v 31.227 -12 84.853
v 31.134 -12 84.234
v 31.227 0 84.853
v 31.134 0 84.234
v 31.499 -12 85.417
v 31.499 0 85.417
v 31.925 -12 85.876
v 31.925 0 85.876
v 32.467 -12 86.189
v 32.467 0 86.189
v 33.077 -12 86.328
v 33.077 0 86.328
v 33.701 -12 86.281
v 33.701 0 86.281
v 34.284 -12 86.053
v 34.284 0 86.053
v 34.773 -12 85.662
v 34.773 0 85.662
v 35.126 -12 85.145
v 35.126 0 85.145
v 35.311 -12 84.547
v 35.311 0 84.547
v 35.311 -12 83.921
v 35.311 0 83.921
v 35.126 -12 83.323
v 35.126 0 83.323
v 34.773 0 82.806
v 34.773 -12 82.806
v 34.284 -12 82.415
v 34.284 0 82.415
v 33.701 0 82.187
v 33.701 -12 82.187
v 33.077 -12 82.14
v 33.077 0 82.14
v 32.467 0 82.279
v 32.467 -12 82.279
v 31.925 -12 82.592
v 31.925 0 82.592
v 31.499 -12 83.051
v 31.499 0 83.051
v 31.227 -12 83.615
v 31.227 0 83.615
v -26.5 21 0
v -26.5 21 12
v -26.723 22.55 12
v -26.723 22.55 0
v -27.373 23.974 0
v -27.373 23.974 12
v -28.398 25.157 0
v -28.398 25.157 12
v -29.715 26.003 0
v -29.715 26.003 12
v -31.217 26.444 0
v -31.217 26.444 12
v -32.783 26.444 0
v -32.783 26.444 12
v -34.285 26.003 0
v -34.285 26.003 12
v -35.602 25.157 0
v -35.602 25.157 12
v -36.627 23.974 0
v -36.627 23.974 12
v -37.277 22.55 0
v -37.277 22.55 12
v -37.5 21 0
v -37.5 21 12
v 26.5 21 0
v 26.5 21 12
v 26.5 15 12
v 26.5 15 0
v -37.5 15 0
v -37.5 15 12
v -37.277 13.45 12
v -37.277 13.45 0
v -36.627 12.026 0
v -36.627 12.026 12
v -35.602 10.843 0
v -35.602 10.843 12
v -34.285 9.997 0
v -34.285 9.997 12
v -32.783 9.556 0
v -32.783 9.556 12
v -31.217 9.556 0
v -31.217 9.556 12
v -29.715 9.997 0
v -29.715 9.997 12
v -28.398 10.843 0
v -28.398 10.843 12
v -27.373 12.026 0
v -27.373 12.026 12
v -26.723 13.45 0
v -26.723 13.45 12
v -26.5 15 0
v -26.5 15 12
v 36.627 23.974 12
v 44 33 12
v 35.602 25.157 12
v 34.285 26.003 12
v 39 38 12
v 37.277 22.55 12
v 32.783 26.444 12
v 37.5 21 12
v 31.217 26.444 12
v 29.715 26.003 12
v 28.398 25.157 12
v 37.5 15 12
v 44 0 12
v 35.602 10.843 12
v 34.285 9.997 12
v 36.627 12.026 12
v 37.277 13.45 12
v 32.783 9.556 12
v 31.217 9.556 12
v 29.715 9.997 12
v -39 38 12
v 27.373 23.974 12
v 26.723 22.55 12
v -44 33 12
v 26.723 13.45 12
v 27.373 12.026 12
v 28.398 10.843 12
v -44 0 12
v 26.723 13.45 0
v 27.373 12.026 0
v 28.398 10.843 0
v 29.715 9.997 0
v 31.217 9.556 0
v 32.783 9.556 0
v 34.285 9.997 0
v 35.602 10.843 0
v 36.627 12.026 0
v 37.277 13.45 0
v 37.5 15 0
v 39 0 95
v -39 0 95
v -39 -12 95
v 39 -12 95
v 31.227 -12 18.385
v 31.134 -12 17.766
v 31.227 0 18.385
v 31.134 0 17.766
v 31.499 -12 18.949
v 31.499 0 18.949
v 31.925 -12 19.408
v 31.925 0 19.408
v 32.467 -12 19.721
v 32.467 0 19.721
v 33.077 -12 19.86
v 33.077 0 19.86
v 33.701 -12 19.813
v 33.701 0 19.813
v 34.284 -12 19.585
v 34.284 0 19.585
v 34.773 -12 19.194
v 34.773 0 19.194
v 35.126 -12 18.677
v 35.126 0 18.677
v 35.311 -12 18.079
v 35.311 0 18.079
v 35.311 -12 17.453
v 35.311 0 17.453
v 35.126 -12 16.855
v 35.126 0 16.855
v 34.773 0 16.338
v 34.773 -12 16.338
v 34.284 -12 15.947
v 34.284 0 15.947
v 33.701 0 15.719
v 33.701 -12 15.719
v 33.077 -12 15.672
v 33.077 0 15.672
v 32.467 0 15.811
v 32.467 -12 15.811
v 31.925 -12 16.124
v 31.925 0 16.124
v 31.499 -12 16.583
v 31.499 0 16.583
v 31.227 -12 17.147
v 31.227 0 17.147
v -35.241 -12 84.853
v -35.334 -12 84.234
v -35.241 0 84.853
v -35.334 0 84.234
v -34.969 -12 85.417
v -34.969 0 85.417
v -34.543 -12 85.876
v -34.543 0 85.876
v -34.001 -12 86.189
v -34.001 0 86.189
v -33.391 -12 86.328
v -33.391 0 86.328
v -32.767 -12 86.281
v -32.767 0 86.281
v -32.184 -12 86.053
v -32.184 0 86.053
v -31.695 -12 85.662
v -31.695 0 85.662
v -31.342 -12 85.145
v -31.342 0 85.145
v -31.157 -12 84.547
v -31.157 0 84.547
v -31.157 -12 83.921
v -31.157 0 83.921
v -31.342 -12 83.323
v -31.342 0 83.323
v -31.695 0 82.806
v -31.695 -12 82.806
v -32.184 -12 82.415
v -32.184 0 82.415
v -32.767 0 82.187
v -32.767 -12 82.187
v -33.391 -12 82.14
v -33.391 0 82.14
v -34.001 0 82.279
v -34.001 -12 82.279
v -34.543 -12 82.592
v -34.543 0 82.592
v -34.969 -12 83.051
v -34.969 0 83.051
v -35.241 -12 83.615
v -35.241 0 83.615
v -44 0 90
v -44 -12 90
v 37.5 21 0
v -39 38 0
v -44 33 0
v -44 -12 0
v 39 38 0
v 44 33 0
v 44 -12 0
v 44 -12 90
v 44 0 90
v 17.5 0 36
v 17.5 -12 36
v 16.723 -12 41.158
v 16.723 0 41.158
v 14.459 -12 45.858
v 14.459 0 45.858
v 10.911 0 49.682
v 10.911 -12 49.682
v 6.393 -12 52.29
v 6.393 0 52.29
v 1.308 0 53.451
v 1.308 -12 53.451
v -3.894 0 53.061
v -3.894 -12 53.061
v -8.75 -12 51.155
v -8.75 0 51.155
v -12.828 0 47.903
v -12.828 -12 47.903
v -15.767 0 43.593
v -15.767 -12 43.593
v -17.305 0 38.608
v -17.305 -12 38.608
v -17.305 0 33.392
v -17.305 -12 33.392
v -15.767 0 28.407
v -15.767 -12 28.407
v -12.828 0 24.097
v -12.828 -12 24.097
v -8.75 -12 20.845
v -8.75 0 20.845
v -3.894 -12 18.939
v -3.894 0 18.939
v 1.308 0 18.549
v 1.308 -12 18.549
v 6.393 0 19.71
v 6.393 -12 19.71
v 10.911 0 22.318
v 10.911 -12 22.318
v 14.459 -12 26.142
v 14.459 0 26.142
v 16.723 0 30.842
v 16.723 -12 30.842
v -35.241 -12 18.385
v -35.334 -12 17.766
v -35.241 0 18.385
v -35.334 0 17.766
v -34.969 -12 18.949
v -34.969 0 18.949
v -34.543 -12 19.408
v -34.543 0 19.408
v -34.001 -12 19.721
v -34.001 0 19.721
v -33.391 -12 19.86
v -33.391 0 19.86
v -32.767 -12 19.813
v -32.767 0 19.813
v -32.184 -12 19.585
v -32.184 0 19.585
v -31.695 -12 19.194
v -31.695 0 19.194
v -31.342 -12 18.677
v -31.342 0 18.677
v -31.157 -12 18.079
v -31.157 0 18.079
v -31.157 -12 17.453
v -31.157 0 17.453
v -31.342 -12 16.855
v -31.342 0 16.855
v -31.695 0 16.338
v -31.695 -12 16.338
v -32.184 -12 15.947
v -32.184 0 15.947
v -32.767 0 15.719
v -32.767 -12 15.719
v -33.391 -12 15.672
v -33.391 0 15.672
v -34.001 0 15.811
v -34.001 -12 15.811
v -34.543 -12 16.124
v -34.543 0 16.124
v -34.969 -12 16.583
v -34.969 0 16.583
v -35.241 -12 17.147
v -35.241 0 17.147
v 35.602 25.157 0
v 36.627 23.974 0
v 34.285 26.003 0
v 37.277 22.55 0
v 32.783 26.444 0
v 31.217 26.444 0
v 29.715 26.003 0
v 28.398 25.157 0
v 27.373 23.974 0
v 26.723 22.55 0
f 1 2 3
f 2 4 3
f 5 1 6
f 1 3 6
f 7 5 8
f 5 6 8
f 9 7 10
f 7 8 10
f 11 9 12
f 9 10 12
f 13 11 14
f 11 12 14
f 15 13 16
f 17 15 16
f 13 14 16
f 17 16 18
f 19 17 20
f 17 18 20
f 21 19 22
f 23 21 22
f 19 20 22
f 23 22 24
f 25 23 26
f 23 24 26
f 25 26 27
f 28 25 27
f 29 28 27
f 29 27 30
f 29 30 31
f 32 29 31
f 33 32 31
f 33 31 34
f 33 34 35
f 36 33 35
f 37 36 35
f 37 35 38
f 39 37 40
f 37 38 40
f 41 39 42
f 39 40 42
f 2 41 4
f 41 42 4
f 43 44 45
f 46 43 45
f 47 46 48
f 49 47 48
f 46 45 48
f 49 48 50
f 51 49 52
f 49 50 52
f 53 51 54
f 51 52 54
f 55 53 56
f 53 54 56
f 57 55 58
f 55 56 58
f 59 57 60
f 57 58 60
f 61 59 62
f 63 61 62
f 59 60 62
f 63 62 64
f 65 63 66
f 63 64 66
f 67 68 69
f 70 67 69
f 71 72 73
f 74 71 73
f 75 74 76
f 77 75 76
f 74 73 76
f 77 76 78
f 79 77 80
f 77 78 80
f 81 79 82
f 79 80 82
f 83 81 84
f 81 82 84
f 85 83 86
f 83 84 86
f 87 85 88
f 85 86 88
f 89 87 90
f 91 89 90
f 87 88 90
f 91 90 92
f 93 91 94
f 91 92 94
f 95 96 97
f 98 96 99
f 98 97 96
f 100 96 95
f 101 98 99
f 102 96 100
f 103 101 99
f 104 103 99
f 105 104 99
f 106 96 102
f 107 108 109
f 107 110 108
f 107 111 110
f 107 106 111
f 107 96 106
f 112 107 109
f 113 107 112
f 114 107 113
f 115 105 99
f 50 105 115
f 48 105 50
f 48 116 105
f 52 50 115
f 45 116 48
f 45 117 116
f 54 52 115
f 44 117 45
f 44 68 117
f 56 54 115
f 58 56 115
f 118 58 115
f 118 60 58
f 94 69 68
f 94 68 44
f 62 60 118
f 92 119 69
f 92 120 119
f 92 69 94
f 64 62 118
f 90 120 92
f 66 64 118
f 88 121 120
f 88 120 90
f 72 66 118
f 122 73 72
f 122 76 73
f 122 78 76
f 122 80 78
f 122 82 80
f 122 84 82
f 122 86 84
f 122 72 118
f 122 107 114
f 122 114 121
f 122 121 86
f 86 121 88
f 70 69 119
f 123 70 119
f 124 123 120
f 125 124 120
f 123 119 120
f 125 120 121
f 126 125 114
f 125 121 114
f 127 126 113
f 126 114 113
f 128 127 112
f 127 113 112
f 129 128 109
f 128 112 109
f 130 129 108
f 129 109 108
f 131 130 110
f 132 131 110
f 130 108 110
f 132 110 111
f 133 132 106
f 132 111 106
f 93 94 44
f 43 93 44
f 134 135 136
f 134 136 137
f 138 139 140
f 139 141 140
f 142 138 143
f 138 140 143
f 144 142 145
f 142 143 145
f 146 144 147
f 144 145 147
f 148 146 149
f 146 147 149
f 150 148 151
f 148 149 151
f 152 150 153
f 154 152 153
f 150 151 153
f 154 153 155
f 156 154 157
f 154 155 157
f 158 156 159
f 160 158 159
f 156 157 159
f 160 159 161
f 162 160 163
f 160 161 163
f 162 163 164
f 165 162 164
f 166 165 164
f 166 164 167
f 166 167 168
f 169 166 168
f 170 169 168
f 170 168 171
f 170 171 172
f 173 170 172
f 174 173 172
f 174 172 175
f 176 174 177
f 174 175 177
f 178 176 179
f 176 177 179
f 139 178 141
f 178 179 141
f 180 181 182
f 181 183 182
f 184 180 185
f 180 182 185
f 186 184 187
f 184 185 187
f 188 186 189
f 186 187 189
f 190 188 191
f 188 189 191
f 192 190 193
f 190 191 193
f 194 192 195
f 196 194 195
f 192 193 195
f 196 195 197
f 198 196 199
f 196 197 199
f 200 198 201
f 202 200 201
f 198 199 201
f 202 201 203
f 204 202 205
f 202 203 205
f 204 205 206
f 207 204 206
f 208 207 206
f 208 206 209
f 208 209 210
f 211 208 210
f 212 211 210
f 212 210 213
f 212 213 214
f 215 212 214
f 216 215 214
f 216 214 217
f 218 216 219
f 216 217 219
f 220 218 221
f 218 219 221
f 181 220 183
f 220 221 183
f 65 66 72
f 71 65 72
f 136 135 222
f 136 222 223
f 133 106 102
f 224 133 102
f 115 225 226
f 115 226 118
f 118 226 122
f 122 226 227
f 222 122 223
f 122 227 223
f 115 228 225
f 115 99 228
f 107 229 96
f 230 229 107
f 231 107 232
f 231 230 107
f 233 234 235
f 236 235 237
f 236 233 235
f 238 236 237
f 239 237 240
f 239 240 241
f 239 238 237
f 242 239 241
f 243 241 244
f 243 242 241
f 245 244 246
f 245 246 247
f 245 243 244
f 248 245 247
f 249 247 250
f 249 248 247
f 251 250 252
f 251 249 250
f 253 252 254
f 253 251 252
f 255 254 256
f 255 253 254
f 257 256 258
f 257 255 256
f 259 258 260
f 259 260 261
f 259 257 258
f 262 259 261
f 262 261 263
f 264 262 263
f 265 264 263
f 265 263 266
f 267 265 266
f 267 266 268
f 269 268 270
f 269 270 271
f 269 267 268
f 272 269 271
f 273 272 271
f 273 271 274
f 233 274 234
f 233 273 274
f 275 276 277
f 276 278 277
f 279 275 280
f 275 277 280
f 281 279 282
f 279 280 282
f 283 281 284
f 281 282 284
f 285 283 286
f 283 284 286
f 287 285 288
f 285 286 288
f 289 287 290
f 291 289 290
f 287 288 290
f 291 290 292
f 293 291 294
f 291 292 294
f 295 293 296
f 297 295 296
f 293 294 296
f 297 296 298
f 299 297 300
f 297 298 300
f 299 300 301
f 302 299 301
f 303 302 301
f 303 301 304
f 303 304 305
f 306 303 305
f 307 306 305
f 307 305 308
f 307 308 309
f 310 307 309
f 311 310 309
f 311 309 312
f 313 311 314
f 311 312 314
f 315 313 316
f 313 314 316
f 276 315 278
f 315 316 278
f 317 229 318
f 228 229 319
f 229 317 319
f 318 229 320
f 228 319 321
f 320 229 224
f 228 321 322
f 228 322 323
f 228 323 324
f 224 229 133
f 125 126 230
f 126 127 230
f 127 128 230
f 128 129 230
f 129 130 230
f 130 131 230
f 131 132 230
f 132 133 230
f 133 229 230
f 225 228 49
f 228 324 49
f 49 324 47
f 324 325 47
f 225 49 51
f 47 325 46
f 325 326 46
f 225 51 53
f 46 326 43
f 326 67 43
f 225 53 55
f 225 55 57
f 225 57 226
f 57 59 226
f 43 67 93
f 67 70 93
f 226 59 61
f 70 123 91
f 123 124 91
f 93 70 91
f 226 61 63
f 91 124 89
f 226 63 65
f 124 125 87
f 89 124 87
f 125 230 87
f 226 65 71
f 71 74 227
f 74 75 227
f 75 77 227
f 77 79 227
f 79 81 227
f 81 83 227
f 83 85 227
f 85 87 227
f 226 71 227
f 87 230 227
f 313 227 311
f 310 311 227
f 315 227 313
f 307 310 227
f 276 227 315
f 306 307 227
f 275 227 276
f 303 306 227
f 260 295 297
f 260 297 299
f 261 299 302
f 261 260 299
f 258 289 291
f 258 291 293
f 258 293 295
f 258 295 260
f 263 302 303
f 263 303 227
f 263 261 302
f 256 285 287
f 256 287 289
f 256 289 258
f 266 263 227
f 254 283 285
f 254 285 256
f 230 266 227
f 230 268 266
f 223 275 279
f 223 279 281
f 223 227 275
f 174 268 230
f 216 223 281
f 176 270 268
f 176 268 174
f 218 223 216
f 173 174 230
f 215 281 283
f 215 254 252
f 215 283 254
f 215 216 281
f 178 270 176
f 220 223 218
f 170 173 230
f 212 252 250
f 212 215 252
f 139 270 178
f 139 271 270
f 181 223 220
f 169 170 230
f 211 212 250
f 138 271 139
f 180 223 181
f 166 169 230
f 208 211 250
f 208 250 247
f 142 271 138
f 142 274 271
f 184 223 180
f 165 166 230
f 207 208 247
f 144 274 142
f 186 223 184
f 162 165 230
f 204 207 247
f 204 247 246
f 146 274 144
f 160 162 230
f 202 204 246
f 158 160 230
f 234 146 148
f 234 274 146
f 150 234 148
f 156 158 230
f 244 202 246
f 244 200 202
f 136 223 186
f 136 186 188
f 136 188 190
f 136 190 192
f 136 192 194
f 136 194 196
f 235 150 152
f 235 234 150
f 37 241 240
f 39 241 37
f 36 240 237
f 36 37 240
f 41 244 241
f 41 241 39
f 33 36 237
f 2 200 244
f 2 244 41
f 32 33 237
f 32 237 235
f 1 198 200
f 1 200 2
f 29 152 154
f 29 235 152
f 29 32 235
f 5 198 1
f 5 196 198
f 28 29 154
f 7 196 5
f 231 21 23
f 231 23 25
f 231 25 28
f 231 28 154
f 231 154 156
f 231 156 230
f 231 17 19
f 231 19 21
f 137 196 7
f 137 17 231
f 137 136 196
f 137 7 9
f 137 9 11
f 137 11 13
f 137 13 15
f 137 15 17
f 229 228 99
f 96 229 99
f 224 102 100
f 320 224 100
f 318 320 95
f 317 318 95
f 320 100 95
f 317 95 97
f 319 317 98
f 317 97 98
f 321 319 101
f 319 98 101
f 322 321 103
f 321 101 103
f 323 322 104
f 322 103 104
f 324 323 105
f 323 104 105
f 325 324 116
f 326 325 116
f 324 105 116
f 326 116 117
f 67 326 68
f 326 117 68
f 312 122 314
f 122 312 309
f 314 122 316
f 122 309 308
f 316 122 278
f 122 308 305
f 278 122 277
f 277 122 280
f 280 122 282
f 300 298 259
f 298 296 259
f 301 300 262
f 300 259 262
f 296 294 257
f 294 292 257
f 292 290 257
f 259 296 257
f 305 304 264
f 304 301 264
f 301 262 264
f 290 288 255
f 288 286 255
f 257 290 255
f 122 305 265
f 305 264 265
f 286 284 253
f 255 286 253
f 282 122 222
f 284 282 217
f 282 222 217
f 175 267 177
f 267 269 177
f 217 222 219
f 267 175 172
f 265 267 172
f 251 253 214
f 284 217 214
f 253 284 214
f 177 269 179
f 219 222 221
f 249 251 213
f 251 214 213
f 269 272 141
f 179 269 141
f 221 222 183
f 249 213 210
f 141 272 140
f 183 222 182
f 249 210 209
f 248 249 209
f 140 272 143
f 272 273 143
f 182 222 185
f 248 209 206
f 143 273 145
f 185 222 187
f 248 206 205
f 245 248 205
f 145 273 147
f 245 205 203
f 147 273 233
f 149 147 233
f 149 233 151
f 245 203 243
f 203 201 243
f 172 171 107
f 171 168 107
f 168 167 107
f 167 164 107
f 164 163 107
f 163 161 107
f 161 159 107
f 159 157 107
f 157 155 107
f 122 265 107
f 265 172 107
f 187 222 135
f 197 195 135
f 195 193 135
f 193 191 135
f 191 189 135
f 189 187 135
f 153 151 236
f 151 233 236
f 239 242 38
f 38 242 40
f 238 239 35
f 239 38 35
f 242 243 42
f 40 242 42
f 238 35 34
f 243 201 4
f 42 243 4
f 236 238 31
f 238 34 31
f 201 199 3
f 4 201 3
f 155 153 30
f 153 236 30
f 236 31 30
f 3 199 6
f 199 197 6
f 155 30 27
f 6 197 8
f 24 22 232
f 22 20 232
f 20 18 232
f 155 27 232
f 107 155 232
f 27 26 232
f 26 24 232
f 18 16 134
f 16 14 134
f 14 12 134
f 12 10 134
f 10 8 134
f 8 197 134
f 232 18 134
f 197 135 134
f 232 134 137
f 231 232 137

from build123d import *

# Parameters (mm, degrees)
F0_W     = 88
F0_H     = 95
F0_R     = 17.5
F1_DEPTH = 12
F2_W     = 88
F2_H     = 12
F3_DEPTH = 38
F5_DEPTH = 12
F7_D     = 4.2
F7_DEPTH = 12
F7_TIP   = 1.2618073
F8_SIZE  = 5


with BuildPart() as f1:
    # F0 (on Front) → F1 (new body)
    with BuildSketch(Plane.XZ):
        with Locations((0, 47.5)):
            Rectangle(F0_W, F0_H)
        with Locations((0, 36)):
            Circle(F0_R, mode=Mode.SUBTRACT)
    extrude(amount=F1_DEPTH)

    # F2 (on face) → F3 (join)
    with BuildSketch(Plane(origin=(0, 0, 0), x_dir=(-1, 0, 0), z_dir=(0, 1, 0))):
        with Locations((0, 6)):
            Rectangle(F2_W, F2_H)
    extrude(amount=F3_DEPTH)

    # F4 (on face) → F5 (cut, through all)
    with BuildSketch(Plane.XY.offset(12)):
        with BuildLine():
            ThreePointArc((26.5, 15), (32, 9.5), (37.5, 15))
            Line((37.5, 15), (37.5, 21))
            ThreePointArc((37.5, 21), (32, 26.5), (26.5, 21))
            Line((26.5, 21), (26.5, 15))
        make_face()
        with BuildLine():
            ThreePointArc((-37.5, 15), (-32, 9.5), (-26.5, 15))
            Line((-26.5, 15), (-26.5, 21))
            ThreePointArc((-26.5, 21), (-32, 26.5), (-37.5, 21))
            Line((-37.5, 21), (-37.5, 15))
        make_face()
    extrude(amount=-F5_DEPTH, mode=Mode.SUBTRACT)

    # F7
    with Locations(Plane.XZ.offset(12)):
        with Locations((-33.2340187158, 84.2340187158), (33.2340187158, 84.2340187158), (33.2340187158, 17.7659812842), (-33.2340187158, 17.7659812842)):
            Hole(F7_D / 2, depth=F7_DEPTH)
            with Locations((0, 0, -(F7_DEPTH + F7_TIP / 2))):  # 118° drill point
                Cone(0, F7_D / 2, F7_TIP, mode=Mode.SUBTRACT)

    # F8
    f8_edges = [f1.edges().sort_by_distance(p)[0] for p in [
        (-44, -6, 95),
        (44, -6, 95),
        (-44, 38, 6),
        (44, 38, 6),
    ]]
    chamfer(f8_edges, length=F8_SIZE)


solid = f1.part
